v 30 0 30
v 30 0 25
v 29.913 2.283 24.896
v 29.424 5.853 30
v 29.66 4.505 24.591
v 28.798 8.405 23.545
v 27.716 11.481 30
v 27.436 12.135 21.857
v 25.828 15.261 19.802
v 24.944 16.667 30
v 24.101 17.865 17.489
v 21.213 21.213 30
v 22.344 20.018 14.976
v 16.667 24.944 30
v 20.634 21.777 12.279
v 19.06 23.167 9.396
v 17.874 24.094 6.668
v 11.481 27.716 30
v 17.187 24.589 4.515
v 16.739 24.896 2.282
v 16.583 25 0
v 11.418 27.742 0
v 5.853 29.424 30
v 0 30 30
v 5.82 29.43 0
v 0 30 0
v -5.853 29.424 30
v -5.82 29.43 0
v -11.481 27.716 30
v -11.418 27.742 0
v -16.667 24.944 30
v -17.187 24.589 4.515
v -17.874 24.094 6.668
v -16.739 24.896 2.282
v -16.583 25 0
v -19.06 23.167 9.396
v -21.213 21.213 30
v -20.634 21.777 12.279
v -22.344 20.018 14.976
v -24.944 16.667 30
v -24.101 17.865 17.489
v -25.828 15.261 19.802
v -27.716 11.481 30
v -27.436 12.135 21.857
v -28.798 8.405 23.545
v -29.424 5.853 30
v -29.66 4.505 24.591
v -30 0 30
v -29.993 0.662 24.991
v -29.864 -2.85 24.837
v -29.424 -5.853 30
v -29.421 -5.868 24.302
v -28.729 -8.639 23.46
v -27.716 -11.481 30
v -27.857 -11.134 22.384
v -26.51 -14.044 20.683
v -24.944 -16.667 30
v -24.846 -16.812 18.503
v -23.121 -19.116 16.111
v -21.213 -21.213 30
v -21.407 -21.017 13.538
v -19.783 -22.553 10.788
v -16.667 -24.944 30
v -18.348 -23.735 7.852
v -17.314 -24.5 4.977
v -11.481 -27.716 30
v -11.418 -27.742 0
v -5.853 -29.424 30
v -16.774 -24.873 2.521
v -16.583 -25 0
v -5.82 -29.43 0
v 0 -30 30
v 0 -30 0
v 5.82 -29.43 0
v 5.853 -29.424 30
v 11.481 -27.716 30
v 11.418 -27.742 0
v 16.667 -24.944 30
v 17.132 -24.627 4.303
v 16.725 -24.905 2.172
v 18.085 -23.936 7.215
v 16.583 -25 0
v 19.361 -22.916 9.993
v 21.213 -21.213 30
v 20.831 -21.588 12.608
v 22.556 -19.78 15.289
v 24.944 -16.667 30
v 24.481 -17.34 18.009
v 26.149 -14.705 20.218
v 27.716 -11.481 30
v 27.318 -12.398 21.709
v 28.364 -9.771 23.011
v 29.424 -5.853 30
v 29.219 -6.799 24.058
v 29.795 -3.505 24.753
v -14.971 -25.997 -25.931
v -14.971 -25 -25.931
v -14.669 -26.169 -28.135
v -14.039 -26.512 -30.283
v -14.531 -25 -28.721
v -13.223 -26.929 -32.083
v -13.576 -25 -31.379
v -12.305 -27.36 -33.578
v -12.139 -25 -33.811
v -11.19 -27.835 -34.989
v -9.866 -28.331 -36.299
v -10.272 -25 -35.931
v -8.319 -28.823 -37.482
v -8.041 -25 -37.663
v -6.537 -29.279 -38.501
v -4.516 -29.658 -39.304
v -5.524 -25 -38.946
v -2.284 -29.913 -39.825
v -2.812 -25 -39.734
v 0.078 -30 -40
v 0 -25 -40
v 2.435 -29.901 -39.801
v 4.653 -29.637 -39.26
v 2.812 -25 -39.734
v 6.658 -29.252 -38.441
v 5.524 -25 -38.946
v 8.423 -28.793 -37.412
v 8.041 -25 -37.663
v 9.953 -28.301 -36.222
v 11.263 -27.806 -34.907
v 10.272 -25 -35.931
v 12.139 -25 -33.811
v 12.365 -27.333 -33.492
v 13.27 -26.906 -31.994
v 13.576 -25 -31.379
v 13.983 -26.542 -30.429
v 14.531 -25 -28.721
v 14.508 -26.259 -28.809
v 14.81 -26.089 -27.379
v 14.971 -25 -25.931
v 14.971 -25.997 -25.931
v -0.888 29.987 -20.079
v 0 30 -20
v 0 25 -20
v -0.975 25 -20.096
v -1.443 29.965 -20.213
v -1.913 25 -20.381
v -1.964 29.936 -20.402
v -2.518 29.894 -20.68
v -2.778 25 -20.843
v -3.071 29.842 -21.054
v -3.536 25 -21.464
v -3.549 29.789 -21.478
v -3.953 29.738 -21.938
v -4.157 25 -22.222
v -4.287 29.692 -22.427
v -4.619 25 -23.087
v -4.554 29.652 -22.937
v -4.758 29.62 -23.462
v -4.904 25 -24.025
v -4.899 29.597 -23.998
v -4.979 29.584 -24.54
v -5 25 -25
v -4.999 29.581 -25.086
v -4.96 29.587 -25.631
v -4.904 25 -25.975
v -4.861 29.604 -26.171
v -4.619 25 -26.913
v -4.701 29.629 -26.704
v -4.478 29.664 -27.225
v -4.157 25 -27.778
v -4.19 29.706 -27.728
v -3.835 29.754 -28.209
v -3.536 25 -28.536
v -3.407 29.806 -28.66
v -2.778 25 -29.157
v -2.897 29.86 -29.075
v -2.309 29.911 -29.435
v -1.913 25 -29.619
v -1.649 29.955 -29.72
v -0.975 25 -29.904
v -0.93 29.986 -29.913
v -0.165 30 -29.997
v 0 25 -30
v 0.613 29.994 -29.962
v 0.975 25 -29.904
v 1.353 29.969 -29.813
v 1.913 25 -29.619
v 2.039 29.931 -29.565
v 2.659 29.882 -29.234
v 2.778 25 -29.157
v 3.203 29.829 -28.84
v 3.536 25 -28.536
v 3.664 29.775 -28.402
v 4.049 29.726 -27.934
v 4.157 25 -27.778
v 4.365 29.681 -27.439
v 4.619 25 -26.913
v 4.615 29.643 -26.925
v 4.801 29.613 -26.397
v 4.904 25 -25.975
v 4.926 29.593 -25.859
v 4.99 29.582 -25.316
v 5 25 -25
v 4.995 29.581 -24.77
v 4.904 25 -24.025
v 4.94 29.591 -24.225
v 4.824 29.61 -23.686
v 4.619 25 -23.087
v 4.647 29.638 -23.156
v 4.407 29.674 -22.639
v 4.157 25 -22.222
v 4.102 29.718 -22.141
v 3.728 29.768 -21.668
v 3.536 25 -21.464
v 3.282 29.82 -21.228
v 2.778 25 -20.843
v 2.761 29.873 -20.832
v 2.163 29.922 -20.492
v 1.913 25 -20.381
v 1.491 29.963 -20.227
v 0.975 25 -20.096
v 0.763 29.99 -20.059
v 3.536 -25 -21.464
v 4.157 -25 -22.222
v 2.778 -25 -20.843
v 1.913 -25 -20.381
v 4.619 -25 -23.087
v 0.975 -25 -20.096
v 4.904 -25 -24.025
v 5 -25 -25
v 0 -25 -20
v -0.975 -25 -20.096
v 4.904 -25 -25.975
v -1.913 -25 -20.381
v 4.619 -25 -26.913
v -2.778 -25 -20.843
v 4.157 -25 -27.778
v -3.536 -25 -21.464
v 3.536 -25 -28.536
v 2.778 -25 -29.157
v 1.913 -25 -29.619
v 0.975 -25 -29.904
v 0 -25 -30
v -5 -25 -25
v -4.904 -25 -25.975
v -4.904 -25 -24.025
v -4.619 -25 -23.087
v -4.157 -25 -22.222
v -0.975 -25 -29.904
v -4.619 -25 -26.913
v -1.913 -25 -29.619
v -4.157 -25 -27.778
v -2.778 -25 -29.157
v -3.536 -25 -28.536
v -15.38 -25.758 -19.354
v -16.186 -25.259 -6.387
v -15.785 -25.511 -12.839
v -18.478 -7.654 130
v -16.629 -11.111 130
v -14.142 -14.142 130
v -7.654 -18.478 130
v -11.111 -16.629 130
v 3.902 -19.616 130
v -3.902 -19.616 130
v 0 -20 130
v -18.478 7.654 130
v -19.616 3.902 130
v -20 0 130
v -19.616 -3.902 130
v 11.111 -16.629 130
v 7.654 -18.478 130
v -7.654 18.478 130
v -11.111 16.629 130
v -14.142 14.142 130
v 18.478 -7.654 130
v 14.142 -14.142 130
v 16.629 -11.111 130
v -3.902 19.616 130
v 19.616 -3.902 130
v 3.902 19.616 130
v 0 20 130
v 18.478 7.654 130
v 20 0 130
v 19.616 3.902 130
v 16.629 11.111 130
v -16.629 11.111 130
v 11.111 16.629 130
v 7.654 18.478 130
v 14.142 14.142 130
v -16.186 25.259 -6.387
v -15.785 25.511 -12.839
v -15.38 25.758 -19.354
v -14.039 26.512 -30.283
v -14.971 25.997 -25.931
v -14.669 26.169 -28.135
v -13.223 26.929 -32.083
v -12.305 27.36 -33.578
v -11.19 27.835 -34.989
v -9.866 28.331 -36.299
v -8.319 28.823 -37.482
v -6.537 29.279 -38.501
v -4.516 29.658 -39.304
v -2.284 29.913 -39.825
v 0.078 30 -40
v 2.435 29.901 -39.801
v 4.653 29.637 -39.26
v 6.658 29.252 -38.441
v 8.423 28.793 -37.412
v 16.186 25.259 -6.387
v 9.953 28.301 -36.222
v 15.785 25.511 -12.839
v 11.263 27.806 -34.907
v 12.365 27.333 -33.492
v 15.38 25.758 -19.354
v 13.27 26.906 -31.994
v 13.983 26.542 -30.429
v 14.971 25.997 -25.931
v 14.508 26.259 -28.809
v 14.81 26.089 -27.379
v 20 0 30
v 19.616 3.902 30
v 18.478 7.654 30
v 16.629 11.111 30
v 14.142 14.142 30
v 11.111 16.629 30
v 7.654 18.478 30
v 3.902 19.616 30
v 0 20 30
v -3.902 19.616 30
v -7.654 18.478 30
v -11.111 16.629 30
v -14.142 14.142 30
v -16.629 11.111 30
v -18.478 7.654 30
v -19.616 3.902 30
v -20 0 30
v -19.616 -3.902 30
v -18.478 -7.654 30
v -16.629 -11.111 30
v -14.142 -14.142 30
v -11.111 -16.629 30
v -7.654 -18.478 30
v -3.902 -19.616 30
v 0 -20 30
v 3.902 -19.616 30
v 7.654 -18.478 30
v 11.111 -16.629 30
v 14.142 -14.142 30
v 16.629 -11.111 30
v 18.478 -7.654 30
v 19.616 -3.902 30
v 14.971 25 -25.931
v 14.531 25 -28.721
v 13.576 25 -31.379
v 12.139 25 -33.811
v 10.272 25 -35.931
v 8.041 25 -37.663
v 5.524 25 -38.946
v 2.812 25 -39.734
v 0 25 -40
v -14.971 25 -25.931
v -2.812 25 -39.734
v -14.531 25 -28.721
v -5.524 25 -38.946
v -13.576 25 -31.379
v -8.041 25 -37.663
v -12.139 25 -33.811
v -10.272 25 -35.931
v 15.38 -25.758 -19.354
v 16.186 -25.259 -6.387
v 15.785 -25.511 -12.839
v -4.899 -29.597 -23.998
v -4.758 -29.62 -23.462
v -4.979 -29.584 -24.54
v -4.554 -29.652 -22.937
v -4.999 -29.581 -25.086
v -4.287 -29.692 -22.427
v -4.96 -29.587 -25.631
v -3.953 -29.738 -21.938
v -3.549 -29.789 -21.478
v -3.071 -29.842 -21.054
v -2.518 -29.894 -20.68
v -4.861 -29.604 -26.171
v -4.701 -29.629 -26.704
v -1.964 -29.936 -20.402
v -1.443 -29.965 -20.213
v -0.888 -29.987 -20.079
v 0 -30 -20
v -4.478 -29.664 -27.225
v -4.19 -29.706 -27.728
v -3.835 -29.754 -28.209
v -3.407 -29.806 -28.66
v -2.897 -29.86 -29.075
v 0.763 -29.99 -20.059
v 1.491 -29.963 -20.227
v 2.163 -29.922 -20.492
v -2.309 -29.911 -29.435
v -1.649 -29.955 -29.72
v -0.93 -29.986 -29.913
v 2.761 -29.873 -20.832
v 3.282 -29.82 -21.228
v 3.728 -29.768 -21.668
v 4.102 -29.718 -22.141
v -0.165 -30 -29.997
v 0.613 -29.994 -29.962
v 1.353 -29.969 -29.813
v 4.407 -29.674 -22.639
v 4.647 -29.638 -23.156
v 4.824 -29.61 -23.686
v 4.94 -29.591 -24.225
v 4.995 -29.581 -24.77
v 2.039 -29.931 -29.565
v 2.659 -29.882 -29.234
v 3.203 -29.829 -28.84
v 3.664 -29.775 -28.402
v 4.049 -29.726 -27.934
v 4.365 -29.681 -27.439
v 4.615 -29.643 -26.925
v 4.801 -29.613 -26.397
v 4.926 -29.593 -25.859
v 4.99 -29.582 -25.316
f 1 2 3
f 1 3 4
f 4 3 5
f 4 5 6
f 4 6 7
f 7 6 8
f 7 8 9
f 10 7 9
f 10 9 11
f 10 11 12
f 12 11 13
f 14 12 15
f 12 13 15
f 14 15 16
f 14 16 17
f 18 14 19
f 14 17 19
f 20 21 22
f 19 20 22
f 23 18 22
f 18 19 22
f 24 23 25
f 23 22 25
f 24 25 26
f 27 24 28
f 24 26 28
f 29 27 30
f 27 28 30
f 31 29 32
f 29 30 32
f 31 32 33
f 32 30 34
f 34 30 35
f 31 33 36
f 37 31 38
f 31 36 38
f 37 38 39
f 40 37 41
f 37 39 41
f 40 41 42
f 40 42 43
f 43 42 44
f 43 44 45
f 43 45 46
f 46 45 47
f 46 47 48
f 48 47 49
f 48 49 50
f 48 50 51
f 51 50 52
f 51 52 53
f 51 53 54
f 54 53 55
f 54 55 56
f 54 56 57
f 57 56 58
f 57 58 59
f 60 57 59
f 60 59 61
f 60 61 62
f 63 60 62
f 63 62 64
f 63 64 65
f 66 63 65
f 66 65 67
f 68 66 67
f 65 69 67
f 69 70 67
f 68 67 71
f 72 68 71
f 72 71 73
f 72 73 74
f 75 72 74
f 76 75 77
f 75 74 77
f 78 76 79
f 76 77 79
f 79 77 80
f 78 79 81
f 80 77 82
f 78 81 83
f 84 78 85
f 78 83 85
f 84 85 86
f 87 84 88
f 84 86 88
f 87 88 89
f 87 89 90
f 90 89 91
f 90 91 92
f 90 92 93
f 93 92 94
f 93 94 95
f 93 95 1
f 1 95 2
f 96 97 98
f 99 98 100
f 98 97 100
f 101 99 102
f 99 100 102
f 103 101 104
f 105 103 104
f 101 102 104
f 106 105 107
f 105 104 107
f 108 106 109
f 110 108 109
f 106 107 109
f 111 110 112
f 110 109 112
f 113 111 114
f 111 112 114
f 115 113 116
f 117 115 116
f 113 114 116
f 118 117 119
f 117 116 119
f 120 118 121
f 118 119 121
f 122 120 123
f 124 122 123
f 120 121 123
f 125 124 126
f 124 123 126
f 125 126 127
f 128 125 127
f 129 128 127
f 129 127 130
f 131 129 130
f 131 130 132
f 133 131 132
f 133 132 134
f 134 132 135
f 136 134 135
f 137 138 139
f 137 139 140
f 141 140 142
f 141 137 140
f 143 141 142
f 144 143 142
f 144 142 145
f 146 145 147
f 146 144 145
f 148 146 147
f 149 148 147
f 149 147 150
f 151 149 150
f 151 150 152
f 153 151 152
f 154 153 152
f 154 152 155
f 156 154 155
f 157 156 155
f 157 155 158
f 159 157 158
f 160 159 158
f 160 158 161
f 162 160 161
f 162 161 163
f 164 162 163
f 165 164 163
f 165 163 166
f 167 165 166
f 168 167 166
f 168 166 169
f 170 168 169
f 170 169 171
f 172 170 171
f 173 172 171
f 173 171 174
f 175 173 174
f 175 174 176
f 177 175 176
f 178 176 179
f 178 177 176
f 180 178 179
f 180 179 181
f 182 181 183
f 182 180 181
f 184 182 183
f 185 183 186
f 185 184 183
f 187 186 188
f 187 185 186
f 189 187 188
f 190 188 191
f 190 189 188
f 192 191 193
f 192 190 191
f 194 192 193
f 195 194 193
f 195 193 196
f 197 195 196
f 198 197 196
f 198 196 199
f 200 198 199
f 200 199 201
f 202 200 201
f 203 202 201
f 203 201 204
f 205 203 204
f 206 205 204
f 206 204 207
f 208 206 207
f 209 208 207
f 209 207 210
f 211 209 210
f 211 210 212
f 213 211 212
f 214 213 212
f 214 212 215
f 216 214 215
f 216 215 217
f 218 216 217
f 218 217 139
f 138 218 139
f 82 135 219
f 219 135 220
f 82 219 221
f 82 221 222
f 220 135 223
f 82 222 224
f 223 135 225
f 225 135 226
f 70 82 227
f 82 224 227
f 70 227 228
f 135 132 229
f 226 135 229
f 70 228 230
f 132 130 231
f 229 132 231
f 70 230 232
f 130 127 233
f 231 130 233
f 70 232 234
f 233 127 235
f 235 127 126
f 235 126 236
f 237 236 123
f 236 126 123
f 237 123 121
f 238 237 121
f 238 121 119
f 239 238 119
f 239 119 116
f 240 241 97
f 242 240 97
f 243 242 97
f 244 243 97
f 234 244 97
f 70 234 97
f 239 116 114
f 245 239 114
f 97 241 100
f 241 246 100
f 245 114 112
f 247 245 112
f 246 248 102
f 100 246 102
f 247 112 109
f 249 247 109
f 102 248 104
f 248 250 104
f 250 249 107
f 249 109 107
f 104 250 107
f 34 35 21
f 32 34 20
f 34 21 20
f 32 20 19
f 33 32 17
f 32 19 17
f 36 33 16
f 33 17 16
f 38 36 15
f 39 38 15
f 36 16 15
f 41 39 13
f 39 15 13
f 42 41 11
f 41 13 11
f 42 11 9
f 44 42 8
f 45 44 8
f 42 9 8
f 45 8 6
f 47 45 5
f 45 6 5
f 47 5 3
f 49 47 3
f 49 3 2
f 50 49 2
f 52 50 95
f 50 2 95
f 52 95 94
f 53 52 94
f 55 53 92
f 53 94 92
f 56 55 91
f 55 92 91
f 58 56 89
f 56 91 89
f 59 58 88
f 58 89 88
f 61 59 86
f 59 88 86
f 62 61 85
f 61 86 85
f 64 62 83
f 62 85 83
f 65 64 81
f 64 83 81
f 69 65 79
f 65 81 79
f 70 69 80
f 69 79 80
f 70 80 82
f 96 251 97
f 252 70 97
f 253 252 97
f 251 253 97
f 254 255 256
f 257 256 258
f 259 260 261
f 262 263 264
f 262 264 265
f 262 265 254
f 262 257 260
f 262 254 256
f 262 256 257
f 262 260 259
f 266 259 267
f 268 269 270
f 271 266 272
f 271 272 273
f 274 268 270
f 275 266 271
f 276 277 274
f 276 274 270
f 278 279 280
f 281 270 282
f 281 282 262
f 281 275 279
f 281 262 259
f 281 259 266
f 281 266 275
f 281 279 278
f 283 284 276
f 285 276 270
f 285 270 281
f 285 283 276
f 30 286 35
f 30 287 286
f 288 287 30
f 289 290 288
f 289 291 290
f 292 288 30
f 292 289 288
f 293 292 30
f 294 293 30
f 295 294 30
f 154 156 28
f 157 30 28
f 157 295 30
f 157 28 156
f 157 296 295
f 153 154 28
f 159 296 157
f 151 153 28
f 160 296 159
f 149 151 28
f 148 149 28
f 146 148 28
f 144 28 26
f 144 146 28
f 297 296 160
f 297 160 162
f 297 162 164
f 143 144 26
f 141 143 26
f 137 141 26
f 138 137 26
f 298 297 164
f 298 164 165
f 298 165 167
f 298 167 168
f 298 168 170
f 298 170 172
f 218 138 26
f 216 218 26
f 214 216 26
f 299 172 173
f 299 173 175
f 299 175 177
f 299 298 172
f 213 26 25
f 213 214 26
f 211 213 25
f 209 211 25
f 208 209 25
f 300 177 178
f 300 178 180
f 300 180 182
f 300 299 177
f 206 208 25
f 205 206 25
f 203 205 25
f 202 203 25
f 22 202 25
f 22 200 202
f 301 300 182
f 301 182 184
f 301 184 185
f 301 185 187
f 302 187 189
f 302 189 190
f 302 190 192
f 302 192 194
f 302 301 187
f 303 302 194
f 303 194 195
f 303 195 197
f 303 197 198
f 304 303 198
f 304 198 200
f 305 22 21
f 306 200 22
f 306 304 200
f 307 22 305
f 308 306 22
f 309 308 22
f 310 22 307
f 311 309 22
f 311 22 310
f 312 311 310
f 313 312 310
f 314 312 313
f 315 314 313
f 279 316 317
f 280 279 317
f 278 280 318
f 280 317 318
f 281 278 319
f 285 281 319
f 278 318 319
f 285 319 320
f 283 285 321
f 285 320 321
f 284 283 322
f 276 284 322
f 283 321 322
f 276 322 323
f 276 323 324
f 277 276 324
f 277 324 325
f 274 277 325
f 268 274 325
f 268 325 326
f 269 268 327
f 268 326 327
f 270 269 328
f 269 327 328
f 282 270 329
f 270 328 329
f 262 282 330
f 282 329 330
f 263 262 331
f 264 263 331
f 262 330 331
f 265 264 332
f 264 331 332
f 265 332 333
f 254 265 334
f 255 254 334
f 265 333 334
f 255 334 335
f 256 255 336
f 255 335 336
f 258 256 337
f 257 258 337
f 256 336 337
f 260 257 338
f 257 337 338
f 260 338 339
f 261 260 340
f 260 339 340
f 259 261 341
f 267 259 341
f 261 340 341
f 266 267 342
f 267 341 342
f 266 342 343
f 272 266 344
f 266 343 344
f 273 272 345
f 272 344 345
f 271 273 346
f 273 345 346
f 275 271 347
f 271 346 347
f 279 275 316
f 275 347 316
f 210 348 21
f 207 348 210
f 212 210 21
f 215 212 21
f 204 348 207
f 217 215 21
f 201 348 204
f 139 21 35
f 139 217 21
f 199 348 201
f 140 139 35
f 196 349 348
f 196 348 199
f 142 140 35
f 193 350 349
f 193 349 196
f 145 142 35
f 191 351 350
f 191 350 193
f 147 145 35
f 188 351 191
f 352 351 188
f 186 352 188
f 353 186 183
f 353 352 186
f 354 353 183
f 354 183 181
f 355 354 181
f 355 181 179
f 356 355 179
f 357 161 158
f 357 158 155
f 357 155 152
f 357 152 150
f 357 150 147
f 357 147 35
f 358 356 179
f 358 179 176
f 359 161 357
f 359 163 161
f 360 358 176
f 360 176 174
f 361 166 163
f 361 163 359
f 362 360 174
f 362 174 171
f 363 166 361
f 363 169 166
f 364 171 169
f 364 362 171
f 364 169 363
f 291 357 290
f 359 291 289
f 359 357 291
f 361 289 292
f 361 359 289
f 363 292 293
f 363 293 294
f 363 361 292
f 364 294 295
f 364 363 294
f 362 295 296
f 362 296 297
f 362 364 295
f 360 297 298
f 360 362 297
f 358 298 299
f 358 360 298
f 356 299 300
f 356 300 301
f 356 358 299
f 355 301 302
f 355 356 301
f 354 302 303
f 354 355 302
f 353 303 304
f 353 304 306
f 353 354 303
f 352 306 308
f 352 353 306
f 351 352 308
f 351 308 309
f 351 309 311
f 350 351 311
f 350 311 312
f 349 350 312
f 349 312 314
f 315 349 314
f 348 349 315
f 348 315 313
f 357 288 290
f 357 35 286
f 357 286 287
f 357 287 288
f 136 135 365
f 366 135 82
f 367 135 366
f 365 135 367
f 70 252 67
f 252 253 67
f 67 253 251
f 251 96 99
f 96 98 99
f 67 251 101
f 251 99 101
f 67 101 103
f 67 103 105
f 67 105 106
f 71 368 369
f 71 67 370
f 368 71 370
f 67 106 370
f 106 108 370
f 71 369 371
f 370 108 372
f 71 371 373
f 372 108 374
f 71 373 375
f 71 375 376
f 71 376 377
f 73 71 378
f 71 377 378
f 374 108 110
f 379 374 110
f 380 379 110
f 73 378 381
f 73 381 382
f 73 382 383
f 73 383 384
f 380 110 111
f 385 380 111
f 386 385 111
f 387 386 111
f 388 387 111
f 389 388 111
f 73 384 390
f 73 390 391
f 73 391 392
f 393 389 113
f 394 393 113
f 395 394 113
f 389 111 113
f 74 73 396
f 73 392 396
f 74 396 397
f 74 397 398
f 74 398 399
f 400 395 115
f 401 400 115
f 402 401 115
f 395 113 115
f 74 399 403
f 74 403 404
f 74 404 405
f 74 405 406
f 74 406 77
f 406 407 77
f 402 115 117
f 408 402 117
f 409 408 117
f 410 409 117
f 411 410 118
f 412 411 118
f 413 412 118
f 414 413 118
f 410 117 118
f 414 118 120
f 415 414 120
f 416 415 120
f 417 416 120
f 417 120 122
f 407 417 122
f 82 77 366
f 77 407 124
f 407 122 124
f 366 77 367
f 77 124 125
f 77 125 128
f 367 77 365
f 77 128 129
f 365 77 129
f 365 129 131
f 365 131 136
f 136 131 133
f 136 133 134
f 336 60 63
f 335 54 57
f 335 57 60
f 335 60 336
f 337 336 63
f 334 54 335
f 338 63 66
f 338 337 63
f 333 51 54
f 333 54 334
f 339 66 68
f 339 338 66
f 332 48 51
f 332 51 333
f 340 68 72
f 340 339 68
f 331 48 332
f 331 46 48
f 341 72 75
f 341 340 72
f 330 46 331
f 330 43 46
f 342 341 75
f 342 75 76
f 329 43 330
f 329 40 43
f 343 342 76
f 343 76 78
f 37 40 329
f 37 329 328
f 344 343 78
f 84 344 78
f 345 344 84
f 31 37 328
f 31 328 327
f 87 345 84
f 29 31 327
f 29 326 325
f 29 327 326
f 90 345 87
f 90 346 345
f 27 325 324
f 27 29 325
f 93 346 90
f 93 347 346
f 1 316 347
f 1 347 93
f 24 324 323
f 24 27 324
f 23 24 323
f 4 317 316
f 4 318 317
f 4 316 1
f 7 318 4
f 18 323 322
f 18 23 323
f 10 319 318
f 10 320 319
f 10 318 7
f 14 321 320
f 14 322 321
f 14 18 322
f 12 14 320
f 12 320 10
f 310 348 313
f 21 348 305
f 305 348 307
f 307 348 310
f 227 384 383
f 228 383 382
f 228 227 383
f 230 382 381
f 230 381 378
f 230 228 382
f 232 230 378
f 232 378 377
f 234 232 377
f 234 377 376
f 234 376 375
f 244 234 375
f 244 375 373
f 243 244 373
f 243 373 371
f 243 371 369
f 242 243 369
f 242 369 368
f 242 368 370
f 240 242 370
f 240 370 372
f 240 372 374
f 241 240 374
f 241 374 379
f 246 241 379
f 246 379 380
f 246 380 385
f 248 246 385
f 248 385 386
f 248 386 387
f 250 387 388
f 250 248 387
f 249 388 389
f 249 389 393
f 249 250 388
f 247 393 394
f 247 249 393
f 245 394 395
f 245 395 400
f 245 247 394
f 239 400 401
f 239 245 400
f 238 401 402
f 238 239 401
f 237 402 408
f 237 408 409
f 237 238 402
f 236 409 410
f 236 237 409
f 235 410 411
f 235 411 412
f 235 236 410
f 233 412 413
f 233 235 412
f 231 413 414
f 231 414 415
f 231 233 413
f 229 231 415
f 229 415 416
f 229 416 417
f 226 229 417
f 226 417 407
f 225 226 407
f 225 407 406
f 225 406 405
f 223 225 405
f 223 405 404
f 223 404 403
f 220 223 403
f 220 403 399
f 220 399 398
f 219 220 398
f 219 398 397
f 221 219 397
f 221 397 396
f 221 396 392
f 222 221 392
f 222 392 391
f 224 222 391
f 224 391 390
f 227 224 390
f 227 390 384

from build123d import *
from build123d.topology import SkipClean

# Parameters (mm, degrees)
BASE_SKETCH_R                   = 30
BASE_EXTRUDE_DEPTH              = 30
PIN_SKETCH_R                    = 20
PIN_EXTRUDE_DEPTH               = 100
SIDE_CUT_REACH                  = 138.748
SIDE_CUT_END_RADIUS             = 30
SIDE_CUT_SKETCH_R               = 25
SIDE_CUT_DIRECTION_2_REACH      = 138.748
SIDE_CUT_DIRECTION_2_END_RADIUS = 30
WING_EXTRUDE_REACH              = 146.309
WING_EXTRUDE_END_RADIUS         = 30
PIN_HOLE_CUT_DEPTH              = 145.308696956
PIN_HOLE_CUT_DEPTH_BACK         = 145.308696956
PIN_HOLE_SKETCH_R               = 5


with BuildPart() as part:
    # Base Sketch → Base Extrude (new body)
    with BuildSketch(Plane.XY):
        Circle(BASE_SKETCH_R)
    extrude(amount=BASE_EXTRUDE_DEPTH)

    # Pin Sketch → Pin Extrude (add)
    with BuildSketch(Plane.XY.offset(30)):
        Circle(PIN_SKETCH_R)
    extrude(amount=PIN_EXTRUDE_DEPTH)

    # Side Cut: up to this cylinder (the profile starts inside it)
    side_cut_end = Plane(origin=(0, 0, 0), z_dir=(0, 0, -1)) * Cylinder(SIDE_CUT_END_RADIUS, 338.496, mode=Mode.PRIVATE)
    # Side Cut Sketch → Side Cut (cut, up to the surface)
    with BuildSketch(Plane(origin=(0, 0, 0), x_dir=(0, 0, -1), z_dir=(1, 0, 0)), mode=Mode.PRIVATE) as side_cut_sk1:
        Circle(SIDE_CUT_SKETCH_R)
    side_cut_tool1 = extrude(side_cut_sk1.sketch, amount=-SIDE_CUT_REACH, mode=Mode.PRIVATE) & side_cut_end
    add(side_cut_tool1.solids().sort_by_distance((0, 0, 0))[0], mode=Mode.SUBTRACT)

    # Side Cut direction 2: up to this cylinder (the profile starts inside it)
    side_cut_direction_2_end = Plane(origin=(0, 0, 0), z_dir=(0, 0, -1)) * Cylinder(SIDE_CUT_DIRECTION_2_END_RADIUS, 338.496, mode=Mode.PRIVATE)
    # Side Cut Sketch → Side Cut direction 2 (cut, up to the surface)
    with BuildSketch(Plane(origin=(0, 0, 0), x_dir=(0, 0, -1), z_dir=(1, 0, 0)), mode=Mode.PRIVATE) as side_cut_direction_2_sk1:
        Circle(SIDE_CUT_SKETCH_R)
    side_cut_direction_2_tool1 = extrude(side_cut_direction_2_sk1.sketch, amount=SIDE_CUT_DIRECTION_2_REACH, mode=Mode.PRIVATE) & side_cut_direction_2_end
    add(side_cut_direction_2_tool1.solids().sort_by_distance((0, 0, 0))[0], mode=Mode.SUBTRACT)

    # Wing Extrude: up to this cylinder (the profile starts inside it)
    with SkipClean():  # the faces are left unmerged after this step: merging them gives an invalid solid
        wing_extrude_end = Plane(origin=(0, 0, -18.188486), z_dir=(0, 0, -1)) * Cylinder(WING_EXTRUDE_END_RADIUS, 353.618, mode=Mode.PRIVATE)
        # Wing Sketch → Wing Extrude (add, up to the surface)
        with BuildSketch(Plane(origin=(0, 25, 0), x_dir=(1, 0, 0), z_dir=(0, 1, 0)), mode=Mode.PRIVATE) as wing_extrude_sk1:
            with BuildLine():
                Line((-16.583123952, 0), (-14.971098535, 25.930703308))
                ThreePointArc((-14.971098535, 25.930703308), (0, 40), (14.971098535, 25.930703308))
                Line((14.971098535, 25.930703308), (16.583123952, 0))
                Line((16.583123952, 0), (-16.583123952, 0))
            make_face()
        wing_extrude_tool1 = extrude(wing_extrude_sk1.sketch, amount=WING_EXTRUDE_REACH, mode=Mode.PRIVATE) & wing_extrude_end
        wing_extrude = wing_extrude_tool1.solids().sort_by_distance((0, 25, -18.188486))[0]
        add(wing_extrude)

    # Wing Mirror: Wing Extrude across plane
    with SkipClean():  # the faces are left unmerged after this step: merging them gives an invalid solid
        add(wing_extrude.mirror(Plane.ZX))

    # Pin Hole Sketch → Pin Hole Cut (cut, two sides: drawn at the far end of the back side and taken through both)
    with SkipClean():  # the faces are left unmerged after this step: merging them gives an invalid solid
        with BuildSketch(Plane.XZ.offset(-25).offset(-PIN_HOLE_CUT_DEPTH_BACK)):
            with Locations(Location((0, -25, 0), (0, 0, 90))):
                Circle(PIN_HOLE_SKETCH_R)
        extrude(amount=PIN_HOLE_CUT_DEPTH + PIN_HOLE_CUT_DEPTH_BACK, mode=Mode.SUBTRACT)


solid = part.part
